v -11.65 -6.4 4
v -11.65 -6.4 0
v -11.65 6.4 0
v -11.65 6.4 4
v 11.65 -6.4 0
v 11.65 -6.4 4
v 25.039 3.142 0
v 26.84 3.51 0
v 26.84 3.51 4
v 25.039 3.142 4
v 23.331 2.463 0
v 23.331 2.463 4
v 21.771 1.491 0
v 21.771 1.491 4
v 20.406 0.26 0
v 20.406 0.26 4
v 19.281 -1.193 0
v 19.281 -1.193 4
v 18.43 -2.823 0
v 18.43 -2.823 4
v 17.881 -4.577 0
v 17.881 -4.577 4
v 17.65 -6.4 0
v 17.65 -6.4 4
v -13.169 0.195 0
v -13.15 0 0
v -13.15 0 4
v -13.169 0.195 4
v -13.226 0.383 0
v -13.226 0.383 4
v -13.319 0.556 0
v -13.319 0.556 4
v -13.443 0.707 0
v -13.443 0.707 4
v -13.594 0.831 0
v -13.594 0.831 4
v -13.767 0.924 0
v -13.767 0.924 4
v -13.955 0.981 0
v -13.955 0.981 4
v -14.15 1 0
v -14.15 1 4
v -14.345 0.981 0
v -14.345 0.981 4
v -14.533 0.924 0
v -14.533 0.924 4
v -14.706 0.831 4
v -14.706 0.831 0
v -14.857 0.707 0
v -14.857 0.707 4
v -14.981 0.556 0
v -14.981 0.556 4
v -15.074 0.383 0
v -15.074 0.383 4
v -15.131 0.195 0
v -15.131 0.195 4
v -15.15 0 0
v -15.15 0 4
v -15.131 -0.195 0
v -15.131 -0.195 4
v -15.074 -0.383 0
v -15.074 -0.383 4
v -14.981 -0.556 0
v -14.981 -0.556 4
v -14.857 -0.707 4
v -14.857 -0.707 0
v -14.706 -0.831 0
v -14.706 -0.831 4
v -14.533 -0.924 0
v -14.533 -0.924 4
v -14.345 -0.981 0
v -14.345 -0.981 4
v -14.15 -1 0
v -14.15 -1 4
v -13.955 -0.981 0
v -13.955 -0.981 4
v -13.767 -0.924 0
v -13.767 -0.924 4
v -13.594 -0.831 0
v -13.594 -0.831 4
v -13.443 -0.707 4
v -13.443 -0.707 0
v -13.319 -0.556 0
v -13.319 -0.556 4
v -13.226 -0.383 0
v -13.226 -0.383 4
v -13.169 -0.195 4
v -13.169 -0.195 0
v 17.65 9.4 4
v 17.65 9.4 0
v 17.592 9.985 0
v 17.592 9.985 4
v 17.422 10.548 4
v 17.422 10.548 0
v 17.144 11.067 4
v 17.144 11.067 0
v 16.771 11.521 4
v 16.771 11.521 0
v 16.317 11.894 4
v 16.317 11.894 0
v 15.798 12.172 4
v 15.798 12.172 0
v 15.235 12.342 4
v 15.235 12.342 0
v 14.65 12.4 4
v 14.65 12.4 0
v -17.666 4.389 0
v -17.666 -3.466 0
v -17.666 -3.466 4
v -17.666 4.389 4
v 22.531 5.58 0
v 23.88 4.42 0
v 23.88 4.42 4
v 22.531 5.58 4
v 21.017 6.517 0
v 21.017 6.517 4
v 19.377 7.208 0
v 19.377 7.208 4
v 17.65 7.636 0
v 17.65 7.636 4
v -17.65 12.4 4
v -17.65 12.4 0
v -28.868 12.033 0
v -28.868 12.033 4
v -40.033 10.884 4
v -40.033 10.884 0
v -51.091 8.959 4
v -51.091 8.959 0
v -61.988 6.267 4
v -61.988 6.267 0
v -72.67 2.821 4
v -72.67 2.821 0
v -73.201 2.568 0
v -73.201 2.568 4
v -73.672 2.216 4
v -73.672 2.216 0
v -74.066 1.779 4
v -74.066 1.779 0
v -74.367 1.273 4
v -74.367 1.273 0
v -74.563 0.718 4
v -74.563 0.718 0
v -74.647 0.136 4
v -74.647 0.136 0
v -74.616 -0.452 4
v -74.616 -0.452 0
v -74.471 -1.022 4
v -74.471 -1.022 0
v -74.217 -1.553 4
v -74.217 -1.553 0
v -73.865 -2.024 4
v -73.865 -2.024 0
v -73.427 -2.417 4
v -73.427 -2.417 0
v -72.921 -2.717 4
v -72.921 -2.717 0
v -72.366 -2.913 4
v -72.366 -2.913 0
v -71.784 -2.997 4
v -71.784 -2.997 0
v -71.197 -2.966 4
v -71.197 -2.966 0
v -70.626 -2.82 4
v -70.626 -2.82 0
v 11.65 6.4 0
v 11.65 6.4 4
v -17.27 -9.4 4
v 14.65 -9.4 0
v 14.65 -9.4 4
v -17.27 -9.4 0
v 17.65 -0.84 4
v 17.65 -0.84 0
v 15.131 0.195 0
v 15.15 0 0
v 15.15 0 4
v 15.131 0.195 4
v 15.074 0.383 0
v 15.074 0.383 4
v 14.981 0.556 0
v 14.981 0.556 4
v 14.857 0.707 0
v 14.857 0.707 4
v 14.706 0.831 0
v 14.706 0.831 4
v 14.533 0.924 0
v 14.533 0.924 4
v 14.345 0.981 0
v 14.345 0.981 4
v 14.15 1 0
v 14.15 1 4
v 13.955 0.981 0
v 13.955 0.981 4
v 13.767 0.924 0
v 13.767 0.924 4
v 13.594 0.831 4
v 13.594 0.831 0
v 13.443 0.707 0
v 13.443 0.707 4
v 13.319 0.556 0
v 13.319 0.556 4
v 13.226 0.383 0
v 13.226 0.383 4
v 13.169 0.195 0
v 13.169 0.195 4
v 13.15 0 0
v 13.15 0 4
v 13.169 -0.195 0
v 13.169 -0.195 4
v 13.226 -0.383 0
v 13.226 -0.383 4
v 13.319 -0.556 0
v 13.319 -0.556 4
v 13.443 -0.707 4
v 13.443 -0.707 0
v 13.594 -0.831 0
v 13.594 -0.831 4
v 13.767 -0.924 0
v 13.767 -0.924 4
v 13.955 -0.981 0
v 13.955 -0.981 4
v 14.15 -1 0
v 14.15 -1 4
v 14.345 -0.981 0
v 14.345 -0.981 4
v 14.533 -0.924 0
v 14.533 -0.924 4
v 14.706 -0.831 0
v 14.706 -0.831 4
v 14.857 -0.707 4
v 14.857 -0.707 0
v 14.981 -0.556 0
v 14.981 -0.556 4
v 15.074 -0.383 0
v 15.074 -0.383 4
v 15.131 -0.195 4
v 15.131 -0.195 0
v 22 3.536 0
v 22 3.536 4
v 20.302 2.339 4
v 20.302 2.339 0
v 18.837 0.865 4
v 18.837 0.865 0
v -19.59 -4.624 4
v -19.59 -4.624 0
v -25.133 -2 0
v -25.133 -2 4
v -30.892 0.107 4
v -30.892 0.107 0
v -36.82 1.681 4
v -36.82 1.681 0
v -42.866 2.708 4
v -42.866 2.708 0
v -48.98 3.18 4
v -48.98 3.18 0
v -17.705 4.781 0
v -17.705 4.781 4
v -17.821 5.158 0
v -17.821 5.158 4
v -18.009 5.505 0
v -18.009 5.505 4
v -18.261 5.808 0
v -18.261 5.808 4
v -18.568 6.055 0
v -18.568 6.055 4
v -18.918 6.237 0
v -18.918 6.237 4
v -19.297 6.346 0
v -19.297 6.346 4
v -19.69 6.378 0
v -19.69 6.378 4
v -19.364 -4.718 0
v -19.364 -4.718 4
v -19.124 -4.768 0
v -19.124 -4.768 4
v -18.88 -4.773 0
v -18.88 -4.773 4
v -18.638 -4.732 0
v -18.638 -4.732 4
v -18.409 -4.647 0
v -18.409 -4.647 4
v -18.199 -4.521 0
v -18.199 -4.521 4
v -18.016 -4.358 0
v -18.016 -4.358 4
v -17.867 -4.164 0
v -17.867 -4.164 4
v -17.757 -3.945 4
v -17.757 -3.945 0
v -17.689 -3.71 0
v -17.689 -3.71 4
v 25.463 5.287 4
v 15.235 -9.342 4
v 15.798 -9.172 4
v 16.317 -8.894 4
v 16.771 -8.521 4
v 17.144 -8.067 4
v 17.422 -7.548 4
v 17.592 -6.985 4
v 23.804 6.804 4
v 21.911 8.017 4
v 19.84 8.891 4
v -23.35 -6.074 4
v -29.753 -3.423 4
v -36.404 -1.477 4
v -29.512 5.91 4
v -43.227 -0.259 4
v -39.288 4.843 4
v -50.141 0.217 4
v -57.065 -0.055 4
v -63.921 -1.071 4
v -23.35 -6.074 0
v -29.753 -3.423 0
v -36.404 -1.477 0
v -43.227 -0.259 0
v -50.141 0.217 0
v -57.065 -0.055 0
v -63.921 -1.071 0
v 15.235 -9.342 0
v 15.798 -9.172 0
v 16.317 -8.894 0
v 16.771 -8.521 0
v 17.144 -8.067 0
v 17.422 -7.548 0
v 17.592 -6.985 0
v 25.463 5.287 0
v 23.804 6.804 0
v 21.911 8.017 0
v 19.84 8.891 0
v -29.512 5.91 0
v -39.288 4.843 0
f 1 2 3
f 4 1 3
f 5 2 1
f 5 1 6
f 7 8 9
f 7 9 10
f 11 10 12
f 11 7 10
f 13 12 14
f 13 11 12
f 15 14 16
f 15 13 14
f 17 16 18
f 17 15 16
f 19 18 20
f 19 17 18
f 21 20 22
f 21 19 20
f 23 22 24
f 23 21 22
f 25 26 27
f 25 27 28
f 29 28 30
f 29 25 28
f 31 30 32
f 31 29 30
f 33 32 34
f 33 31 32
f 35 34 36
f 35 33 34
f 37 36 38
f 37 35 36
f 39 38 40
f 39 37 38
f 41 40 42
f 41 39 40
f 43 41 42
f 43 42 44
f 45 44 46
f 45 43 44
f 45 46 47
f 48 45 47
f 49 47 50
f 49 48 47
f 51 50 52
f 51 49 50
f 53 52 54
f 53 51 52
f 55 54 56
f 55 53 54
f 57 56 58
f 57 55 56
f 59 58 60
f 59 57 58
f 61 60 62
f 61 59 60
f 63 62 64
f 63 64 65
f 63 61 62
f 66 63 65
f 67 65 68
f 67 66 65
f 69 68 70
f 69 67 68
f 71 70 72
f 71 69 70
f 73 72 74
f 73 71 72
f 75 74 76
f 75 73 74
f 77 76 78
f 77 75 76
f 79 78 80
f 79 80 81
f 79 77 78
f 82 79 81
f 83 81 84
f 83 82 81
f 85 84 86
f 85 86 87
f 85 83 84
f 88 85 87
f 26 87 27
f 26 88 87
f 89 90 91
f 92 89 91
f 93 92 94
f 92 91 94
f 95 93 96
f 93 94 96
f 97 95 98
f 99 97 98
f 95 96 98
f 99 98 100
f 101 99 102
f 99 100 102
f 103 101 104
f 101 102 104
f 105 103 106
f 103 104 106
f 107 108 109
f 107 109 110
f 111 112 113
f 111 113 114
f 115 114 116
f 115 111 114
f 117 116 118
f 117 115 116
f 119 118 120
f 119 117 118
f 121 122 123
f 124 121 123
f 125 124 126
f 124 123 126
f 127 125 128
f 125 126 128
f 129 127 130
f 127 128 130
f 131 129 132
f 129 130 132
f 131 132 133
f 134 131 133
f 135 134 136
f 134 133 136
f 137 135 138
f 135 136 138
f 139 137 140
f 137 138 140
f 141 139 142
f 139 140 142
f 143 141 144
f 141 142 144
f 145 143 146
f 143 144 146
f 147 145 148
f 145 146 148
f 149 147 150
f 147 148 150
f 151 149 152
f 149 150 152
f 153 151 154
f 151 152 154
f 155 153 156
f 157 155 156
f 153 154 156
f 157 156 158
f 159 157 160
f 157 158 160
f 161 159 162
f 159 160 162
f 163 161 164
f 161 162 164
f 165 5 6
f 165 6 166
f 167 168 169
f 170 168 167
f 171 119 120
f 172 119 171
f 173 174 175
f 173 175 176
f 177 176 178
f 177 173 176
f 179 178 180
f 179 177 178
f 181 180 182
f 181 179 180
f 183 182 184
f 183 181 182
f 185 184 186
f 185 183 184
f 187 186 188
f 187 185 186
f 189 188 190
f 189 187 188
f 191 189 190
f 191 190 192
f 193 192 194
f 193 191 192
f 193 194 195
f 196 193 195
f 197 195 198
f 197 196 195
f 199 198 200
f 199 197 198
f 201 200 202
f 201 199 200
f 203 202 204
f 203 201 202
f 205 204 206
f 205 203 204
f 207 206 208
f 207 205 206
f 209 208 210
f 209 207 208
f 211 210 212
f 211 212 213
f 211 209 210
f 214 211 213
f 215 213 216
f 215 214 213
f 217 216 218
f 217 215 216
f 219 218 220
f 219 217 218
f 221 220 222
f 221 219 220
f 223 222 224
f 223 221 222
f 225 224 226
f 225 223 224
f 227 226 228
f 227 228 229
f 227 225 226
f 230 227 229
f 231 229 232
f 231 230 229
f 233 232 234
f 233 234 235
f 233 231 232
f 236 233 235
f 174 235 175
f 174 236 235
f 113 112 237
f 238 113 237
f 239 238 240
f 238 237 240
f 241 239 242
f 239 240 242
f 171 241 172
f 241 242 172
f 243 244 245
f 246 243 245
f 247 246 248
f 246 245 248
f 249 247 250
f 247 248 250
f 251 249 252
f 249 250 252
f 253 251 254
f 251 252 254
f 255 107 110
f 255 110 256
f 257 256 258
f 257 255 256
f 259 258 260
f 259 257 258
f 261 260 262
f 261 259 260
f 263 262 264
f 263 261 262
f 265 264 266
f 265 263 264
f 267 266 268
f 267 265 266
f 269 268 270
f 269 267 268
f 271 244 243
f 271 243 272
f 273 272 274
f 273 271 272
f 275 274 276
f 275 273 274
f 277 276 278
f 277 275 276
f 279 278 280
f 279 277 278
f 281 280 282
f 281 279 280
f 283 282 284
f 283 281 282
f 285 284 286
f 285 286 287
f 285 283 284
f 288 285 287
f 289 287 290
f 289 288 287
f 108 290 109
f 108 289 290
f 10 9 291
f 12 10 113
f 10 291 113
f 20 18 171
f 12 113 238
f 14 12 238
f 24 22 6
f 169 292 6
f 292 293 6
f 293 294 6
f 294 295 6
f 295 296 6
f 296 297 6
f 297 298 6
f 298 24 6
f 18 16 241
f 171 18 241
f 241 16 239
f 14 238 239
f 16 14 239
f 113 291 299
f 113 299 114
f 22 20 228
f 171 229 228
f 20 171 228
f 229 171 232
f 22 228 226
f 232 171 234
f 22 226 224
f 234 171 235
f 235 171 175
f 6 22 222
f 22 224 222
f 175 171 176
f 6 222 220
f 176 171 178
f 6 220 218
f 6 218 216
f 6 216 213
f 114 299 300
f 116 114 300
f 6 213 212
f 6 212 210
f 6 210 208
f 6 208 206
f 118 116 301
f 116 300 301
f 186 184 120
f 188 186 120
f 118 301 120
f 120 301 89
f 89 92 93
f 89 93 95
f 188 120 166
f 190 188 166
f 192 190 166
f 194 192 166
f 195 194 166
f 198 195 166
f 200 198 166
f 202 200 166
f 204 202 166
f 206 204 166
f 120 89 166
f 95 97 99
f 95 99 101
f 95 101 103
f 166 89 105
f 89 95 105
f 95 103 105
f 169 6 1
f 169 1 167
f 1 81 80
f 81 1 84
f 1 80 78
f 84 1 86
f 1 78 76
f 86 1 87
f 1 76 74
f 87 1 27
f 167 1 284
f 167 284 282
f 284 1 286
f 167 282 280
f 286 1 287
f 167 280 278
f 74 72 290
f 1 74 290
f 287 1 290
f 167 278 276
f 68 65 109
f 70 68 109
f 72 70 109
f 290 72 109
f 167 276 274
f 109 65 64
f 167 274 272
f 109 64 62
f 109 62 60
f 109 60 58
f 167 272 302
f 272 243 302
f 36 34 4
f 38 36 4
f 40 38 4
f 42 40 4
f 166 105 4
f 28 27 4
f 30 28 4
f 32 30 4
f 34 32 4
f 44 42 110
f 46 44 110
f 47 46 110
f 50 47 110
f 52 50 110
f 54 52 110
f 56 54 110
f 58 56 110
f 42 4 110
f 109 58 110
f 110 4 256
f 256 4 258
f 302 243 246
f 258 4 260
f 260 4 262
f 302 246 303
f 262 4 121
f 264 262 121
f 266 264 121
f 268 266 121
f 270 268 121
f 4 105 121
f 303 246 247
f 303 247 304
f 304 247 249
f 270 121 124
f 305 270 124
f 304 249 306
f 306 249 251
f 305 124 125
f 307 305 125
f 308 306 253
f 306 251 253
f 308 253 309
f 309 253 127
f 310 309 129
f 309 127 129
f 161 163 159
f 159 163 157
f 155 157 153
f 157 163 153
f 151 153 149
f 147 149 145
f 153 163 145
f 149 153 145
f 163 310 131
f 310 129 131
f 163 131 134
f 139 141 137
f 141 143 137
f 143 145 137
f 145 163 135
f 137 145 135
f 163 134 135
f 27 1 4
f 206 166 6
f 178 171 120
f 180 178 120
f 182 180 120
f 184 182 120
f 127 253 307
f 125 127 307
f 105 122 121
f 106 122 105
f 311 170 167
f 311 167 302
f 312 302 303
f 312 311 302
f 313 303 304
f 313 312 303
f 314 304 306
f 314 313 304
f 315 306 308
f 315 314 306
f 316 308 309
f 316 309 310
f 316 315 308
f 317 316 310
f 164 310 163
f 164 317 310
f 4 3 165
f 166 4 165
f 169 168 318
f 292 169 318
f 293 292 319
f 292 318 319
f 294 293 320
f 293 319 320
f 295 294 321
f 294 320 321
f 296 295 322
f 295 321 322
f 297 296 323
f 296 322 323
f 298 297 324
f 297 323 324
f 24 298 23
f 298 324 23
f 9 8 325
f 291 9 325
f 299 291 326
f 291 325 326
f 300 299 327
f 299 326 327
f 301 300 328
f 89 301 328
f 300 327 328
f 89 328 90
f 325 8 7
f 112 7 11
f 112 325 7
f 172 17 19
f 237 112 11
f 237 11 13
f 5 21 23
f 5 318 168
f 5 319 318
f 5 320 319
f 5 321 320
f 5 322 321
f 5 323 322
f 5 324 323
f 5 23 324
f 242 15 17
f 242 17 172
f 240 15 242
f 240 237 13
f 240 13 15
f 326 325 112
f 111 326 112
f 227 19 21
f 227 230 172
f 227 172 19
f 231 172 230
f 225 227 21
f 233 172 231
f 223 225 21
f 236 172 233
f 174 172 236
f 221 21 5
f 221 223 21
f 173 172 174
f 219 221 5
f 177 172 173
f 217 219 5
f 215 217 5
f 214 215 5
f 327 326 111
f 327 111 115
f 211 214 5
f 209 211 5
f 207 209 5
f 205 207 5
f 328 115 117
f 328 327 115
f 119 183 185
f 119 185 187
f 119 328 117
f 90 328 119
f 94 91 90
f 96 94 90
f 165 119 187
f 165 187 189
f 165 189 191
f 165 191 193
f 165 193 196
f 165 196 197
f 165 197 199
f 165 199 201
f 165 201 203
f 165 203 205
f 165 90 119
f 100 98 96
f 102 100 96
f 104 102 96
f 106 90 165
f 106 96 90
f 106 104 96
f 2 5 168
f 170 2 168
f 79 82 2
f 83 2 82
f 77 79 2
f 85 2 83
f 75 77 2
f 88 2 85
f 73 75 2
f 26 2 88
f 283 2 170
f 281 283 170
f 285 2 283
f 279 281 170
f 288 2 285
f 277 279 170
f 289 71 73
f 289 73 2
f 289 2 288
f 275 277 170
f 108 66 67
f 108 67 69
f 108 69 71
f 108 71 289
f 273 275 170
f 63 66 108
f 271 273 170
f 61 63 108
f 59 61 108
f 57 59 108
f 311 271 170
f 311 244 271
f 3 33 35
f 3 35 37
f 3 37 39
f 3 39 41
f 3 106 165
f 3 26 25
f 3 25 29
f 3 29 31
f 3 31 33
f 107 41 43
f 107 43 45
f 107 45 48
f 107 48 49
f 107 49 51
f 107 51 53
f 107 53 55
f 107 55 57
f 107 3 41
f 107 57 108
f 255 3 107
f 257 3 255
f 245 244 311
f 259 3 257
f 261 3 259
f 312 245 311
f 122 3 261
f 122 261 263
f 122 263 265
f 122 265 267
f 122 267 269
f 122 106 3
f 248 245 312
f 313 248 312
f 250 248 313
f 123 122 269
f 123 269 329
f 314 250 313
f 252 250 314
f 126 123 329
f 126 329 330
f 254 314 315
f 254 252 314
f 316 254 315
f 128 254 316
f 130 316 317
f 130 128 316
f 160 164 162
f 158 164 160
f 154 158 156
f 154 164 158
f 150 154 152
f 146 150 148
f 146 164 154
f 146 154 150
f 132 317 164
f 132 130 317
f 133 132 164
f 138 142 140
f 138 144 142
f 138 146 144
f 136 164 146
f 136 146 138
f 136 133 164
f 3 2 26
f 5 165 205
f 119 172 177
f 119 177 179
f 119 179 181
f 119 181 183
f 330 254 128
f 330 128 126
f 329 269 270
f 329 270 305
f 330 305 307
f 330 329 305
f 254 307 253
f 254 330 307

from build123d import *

# Parameters (mm, degrees)
SKETCH_R  = 1
SKETCH_W  = 23.3
SKETCH_H  = 12.8
PAD_DEPTH = 4


with BuildPart() as part:
    # Sketch → Pad (new body)
    with BuildSketch(Plane.XY):
        with BuildLine():
            Line((-17.65, 12.4), (14.65, 12.4))
            ThreePointArc((17.65, 9.4), (16.77132, 11.52132), (14.65, 12.4))
            ThreePointArc((26.84, 3.51), (22.883245, 7.450836), (17.65, 9.4))
            ThreePointArc((26.84, 3.51), (20.406481, 0.259943), (17.65, -6.4))
            ThreePointArc((14.65, -9.4), (16.77132, -8.52132), (17.65, -6.4))
            Line((14.65, -9.4), (-17.27, -9.4))
            ThreePointArc((-17.27, -9.4), (-43.226691, -0.259051), (-70.626477, -2.82))
            ThreePointArc((-72.67, 2.821276), (-74.470639, -1.021762), (-70.626477, -2.82))
            ThreePointArc((-17.65, 12.4), (-45.579054, 10.017677), (-72.67, 2.821276))
        make_face()
        with Locations((-14.15, 0)):
            Circle(SKETCH_R, mode=Mode.SUBTRACT)
        with Locations((14.15, 0)):
            Circle(SKETCH_R, mode=Mode.SUBTRACT)
        Rectangle(SKETCH_W, SKETCH_H, mode=Mode.SUBTRACT)
        with BuildLine():
            Line((17.65, 7.636176), (17.65, -0.84))
            ThreePointArc((23.88, 4.42), (20.301686, 2.338754), (17.65, -0.84))
            ThreePointArc((23.88, 4.42), (21.017458, 6.51712), (17.65, 7.636176))
        make_face(mode=Mode.SUBTRACT)
        with BuildLine():
            Line((-17.66615, -3.466269), (-17.66615, 4.388555))
            ThreePointArc((-17.66615, 4.388555), (-18.261027, 5.807615), (-19.69, 6.378267))
            ThreePointArc((-19.69, 6.378267), (-34.408413, 5.451456), (-48.98, 3.18))
            ThreePointArc((-19.59, -4.623545), (-33.83794, 0.961961), (-48.98, 3.18))
            ThreePointArc((-19.59, -4.623545), (-18.300889, -4.58882), (-17.66615, -3.466269))
        make_face(mode=Mode.SUBTRACT)
    extrude(amount=PAD_DEPTH)


solid = part.part
